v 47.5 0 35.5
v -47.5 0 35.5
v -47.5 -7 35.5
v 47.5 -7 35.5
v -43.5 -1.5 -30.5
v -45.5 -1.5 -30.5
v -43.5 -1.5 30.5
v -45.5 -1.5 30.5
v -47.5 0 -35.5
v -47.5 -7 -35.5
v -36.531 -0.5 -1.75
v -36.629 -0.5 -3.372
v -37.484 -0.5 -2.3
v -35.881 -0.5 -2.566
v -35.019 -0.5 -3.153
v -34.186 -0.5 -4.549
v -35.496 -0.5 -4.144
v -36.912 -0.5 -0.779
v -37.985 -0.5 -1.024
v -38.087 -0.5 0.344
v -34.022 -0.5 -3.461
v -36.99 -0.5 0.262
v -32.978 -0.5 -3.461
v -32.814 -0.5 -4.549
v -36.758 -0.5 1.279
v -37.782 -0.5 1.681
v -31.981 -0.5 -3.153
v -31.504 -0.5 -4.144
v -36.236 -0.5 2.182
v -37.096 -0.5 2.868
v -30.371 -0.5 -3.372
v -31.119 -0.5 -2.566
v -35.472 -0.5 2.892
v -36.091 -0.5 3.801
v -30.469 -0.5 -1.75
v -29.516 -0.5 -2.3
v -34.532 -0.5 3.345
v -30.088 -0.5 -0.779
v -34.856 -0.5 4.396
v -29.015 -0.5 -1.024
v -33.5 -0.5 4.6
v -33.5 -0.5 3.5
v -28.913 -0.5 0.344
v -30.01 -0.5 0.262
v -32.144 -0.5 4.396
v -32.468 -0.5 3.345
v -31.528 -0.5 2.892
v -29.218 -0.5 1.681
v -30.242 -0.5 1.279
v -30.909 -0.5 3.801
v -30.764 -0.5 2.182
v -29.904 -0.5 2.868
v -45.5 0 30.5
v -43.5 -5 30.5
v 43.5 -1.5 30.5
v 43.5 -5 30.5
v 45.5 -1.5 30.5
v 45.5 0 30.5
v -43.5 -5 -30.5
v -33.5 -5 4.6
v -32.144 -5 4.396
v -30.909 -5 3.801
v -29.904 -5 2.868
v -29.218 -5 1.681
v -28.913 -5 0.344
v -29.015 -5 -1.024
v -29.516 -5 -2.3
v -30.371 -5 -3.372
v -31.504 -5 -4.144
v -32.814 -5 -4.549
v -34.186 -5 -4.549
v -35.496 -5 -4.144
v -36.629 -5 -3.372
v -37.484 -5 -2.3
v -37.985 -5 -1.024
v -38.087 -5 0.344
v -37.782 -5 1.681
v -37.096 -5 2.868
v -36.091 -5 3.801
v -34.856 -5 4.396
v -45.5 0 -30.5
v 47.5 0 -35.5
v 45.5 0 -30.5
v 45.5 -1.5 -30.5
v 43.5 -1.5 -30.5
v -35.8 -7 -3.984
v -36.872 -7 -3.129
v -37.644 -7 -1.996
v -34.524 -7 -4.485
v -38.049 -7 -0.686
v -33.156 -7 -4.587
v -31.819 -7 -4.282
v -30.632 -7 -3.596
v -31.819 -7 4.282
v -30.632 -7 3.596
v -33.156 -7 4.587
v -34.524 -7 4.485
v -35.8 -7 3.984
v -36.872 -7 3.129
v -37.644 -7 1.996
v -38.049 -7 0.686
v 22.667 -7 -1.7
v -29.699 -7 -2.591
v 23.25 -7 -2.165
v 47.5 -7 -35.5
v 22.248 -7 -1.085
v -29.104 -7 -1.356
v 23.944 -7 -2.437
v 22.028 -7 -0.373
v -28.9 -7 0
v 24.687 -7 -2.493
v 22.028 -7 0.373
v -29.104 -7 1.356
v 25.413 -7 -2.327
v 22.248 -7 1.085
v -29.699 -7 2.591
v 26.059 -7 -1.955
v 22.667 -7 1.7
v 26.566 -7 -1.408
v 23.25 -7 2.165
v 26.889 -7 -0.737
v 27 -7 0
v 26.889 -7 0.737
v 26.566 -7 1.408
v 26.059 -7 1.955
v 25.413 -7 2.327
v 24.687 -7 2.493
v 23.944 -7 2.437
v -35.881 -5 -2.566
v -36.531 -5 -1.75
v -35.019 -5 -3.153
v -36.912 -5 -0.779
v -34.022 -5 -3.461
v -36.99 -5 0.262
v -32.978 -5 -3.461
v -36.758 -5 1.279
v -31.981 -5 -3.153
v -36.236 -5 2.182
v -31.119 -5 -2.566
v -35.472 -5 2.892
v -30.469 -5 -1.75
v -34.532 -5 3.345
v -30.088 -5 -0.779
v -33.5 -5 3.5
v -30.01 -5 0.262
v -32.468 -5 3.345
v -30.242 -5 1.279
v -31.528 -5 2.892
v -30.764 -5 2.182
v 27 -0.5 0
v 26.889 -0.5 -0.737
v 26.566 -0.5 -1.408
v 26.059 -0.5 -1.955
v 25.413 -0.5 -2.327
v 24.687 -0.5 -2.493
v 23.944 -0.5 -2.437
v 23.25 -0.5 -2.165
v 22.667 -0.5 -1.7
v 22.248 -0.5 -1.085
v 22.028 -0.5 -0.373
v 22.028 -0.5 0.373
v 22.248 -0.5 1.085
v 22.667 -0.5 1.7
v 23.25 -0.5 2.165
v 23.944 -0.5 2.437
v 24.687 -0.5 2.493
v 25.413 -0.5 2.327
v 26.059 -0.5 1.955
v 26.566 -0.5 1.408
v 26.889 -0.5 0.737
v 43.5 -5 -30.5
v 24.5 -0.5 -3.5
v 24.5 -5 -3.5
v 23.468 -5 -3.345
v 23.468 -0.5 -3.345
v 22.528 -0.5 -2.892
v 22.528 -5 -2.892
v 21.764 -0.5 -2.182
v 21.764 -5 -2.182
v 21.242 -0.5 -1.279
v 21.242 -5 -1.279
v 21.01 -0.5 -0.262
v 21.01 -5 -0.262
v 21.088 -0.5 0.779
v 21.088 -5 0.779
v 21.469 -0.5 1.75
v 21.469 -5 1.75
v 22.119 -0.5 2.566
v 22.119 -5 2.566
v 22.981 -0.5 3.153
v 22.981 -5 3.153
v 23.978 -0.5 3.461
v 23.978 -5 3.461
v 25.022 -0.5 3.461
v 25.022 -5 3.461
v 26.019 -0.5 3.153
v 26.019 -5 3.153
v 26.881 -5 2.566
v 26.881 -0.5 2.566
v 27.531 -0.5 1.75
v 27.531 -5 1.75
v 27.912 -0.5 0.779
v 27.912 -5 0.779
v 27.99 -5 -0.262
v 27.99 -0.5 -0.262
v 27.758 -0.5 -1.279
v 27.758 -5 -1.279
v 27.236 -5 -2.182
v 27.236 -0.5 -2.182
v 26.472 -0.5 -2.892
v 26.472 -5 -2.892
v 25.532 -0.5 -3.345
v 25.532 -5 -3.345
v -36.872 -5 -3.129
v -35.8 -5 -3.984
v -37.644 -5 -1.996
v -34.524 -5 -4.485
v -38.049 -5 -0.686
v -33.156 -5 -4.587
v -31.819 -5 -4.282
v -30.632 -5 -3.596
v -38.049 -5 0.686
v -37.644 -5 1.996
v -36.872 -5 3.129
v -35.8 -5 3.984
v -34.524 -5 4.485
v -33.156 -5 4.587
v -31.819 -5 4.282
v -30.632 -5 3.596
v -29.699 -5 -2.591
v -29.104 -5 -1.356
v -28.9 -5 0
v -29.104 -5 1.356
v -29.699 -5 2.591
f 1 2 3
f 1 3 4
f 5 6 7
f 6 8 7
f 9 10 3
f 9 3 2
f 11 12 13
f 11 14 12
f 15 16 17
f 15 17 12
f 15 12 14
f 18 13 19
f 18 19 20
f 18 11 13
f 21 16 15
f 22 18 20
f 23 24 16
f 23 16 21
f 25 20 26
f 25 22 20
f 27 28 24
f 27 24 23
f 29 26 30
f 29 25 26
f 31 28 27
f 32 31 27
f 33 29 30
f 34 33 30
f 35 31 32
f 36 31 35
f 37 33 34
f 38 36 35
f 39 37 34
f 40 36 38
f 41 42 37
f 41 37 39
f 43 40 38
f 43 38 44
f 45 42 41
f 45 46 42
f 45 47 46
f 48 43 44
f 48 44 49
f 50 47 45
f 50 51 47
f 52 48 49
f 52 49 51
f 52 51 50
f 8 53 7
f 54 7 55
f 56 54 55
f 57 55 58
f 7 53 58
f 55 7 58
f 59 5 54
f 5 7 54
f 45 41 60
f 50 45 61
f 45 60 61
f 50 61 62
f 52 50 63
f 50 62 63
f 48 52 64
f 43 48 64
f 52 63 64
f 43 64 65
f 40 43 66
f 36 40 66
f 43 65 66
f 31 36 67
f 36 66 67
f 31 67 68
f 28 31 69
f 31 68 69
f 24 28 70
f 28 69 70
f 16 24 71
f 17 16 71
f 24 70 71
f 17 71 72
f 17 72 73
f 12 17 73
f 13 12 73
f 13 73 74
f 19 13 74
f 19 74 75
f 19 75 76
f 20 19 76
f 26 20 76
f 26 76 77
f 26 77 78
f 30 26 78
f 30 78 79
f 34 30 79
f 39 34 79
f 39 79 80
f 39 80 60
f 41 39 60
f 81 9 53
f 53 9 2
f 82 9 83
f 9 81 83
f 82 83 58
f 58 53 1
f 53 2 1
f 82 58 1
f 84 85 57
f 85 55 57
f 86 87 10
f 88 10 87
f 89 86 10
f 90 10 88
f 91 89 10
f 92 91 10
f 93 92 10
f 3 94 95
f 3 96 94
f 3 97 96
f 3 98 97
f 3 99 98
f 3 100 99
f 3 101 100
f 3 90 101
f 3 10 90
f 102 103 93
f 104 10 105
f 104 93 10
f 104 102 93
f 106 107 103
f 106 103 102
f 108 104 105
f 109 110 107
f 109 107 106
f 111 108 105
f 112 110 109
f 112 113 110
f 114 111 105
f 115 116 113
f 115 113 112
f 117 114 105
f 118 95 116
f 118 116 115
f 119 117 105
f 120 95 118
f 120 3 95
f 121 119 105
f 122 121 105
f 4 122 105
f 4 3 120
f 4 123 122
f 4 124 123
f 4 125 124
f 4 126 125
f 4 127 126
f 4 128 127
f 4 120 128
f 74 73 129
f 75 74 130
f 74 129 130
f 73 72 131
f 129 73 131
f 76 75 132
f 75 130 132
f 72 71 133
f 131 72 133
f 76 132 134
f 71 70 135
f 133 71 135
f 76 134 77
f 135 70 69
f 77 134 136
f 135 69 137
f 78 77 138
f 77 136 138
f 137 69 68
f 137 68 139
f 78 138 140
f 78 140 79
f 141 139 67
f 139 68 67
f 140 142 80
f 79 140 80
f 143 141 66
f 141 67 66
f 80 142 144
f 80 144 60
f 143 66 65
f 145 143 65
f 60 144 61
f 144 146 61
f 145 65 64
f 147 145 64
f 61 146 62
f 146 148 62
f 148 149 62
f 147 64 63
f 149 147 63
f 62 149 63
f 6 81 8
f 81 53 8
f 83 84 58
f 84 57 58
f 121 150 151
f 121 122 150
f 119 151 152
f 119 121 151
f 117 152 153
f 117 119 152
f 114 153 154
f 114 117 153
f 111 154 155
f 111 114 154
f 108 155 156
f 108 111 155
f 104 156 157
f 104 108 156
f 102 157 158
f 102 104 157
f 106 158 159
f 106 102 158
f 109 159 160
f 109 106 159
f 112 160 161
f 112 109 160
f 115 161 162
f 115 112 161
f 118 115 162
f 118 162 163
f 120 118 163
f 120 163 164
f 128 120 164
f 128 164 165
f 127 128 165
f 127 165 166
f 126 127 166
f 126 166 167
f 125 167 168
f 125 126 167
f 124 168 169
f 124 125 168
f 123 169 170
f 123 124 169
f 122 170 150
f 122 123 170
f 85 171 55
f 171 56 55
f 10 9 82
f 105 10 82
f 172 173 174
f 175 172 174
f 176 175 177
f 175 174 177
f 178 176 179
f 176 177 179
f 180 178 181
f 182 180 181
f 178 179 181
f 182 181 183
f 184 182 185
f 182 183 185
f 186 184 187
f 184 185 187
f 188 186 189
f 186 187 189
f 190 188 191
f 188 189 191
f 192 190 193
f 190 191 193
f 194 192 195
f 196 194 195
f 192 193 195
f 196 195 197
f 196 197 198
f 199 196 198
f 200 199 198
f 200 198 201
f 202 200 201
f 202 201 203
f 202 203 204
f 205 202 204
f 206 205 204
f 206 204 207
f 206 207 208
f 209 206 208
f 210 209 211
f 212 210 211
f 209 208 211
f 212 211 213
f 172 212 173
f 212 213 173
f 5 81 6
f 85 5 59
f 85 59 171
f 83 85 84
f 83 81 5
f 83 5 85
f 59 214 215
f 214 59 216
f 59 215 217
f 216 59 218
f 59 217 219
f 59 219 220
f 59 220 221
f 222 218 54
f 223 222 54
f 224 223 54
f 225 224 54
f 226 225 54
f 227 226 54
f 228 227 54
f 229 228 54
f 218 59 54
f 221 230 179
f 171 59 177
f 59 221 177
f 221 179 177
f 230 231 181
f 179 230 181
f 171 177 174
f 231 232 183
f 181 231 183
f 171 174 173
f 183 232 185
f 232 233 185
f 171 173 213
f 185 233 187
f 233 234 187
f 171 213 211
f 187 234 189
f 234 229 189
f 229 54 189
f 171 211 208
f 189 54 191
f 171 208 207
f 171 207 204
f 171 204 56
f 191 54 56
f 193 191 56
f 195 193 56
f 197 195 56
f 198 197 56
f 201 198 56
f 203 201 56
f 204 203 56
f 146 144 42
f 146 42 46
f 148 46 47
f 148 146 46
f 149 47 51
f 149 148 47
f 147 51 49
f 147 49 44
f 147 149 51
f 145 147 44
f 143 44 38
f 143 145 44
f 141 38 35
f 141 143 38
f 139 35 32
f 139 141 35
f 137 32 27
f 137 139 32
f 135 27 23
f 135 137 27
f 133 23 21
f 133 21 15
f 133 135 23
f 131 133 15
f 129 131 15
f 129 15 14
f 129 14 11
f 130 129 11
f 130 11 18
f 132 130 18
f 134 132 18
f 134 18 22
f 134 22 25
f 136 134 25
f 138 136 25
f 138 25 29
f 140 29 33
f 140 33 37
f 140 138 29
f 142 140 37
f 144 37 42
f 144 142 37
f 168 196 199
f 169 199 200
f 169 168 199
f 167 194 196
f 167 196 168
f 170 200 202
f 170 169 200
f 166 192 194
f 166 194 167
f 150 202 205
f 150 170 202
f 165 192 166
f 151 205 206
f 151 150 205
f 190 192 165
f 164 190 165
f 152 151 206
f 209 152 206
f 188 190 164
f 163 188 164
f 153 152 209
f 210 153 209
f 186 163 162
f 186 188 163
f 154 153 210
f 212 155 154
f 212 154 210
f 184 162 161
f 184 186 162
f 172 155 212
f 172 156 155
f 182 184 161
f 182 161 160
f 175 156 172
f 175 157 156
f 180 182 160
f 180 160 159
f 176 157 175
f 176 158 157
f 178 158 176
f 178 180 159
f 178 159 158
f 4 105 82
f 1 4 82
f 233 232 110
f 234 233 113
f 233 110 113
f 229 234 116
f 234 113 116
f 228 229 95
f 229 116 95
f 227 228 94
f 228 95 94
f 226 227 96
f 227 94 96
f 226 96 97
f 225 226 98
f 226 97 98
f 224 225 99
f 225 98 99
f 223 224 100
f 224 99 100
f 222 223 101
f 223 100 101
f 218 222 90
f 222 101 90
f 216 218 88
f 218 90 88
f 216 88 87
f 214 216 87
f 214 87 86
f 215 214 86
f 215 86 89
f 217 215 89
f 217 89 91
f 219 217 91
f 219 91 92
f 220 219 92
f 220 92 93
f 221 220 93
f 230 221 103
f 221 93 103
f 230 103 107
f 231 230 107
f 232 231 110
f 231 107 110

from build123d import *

# Parameters (mm, degrees)
PCB_STAND_DEPTH    = 30.5
SKETCH3_W          = 95
SKETCH3_H          = 7
EXTRA_BOTTOM_DEPTH = 5
SENSOR_HOLES_2_R   = 4.6
SENSOR_HOLES_2_R_2 = 2.5
SENSOR_HOLES_DEPTH = 60.711807878
SKETCH4_R          = 3.5
SKETCH4_R_2        = 2.5
SKETCH4_R_3        = 4.6
CYLINDER_DEPTH     = 4.5


with BuildPart() as part:
    # Master_Geometry → PCB_Stand (new, symmetric)
    with BuildSketch(Plane.XY):
        Polygon((-47.5, -5), (-47.5, 0), (-45.5, 0), (-45.5, -1.5), (-43.5, -1.5), (-43.5, -5), (43.5, -5), (43.5, -1.5), (45.5, -1.5), (45.5, 0), (47.5, 0), (47.5, -5), (47.5, -7), (-47.5, -7), align=None)
    extrude(amount=PCB_STAND_DEPTH, both=True)

    # Sketch3 → Extra_Bottom (add)
    with BuildSketch(Plane.XY.offset(30.5)):
        with Locations((0, -3.5)):
            Rectangle(SKETCH3_W, SKETCH3_H)
    extra_bottom = extrude(amount=EXTRA_BOTTOM_DEPTH)

    # Mirror2: Extra_Bottom across plane
    add(extra_bottom.mirror(Plane.XY))

    # Sensor-Holes 2 → Sensor_Holes (cut, through all)
    with BuildSketch(Plane.XZ.offset(7)):
        with Locations((-33.5, 0)):
            Circle(SENSOR_HOLES_2_R)
        with Locations((24.5, 0)):
            Circle(SENSOR_HOLES_2_R_2)
    extrude(amount=-SENSOR_HOLES_DEPTH, mode=Mode.SUBTRACT)

    # Sketch4 → Cylinder (add)
    # profile 1 of 2: a face of its own
    with BuildSketch(Plane(origin=(0, -5, 0), x_dir=(1, 0, 0), z_dir=(0, 1, 0))):
        with Locations(Location((24.5, 0, 0), (0, 0, 90))):
            Circle(SKETCH4_R)
        with Locations((24.5, 0)):
            Circle(SKETCH4_R_2, mode=Mode.SUBTRACT)
    # profile 2 of 2: a face of its own
    with BuildSketch(Plane(origin=(0, -5, 0), x_dir=(1, 0, 0), z_dir=(0, 1, 0))):
        with Locations(Location((-33.5, 0, 0), (0, 0, 270))):
            Circle(SKETCH4_R_3)
        with Locations(Location((-33.5, 0, 0), (0, 0, 270))):
            Circle(SKETCH4_R, mode=Mode.SUBTRACT)
    extrude(amount=CYLINDER_DEPTH)


with BuildPart() as cylinder_piece_1:
    # of the separate pieces the step leaves, piece 1, a body of its own (cylinder_pieces)
    add(part.part.solids().sort_by_distance((-47.5, 0, 35.5))[0])


with BuildPart() as cylinder_piece_2:
    # of the separate pieces the step leaves, piece 2, a body of its own (cylinder_pieces)
    add(part.part.solids().sort_by_distance((-33.5, -0.5, 4.6))[0])


solid = Compound([cylinder_piece_1.part, cylinder_piece_2.part])
